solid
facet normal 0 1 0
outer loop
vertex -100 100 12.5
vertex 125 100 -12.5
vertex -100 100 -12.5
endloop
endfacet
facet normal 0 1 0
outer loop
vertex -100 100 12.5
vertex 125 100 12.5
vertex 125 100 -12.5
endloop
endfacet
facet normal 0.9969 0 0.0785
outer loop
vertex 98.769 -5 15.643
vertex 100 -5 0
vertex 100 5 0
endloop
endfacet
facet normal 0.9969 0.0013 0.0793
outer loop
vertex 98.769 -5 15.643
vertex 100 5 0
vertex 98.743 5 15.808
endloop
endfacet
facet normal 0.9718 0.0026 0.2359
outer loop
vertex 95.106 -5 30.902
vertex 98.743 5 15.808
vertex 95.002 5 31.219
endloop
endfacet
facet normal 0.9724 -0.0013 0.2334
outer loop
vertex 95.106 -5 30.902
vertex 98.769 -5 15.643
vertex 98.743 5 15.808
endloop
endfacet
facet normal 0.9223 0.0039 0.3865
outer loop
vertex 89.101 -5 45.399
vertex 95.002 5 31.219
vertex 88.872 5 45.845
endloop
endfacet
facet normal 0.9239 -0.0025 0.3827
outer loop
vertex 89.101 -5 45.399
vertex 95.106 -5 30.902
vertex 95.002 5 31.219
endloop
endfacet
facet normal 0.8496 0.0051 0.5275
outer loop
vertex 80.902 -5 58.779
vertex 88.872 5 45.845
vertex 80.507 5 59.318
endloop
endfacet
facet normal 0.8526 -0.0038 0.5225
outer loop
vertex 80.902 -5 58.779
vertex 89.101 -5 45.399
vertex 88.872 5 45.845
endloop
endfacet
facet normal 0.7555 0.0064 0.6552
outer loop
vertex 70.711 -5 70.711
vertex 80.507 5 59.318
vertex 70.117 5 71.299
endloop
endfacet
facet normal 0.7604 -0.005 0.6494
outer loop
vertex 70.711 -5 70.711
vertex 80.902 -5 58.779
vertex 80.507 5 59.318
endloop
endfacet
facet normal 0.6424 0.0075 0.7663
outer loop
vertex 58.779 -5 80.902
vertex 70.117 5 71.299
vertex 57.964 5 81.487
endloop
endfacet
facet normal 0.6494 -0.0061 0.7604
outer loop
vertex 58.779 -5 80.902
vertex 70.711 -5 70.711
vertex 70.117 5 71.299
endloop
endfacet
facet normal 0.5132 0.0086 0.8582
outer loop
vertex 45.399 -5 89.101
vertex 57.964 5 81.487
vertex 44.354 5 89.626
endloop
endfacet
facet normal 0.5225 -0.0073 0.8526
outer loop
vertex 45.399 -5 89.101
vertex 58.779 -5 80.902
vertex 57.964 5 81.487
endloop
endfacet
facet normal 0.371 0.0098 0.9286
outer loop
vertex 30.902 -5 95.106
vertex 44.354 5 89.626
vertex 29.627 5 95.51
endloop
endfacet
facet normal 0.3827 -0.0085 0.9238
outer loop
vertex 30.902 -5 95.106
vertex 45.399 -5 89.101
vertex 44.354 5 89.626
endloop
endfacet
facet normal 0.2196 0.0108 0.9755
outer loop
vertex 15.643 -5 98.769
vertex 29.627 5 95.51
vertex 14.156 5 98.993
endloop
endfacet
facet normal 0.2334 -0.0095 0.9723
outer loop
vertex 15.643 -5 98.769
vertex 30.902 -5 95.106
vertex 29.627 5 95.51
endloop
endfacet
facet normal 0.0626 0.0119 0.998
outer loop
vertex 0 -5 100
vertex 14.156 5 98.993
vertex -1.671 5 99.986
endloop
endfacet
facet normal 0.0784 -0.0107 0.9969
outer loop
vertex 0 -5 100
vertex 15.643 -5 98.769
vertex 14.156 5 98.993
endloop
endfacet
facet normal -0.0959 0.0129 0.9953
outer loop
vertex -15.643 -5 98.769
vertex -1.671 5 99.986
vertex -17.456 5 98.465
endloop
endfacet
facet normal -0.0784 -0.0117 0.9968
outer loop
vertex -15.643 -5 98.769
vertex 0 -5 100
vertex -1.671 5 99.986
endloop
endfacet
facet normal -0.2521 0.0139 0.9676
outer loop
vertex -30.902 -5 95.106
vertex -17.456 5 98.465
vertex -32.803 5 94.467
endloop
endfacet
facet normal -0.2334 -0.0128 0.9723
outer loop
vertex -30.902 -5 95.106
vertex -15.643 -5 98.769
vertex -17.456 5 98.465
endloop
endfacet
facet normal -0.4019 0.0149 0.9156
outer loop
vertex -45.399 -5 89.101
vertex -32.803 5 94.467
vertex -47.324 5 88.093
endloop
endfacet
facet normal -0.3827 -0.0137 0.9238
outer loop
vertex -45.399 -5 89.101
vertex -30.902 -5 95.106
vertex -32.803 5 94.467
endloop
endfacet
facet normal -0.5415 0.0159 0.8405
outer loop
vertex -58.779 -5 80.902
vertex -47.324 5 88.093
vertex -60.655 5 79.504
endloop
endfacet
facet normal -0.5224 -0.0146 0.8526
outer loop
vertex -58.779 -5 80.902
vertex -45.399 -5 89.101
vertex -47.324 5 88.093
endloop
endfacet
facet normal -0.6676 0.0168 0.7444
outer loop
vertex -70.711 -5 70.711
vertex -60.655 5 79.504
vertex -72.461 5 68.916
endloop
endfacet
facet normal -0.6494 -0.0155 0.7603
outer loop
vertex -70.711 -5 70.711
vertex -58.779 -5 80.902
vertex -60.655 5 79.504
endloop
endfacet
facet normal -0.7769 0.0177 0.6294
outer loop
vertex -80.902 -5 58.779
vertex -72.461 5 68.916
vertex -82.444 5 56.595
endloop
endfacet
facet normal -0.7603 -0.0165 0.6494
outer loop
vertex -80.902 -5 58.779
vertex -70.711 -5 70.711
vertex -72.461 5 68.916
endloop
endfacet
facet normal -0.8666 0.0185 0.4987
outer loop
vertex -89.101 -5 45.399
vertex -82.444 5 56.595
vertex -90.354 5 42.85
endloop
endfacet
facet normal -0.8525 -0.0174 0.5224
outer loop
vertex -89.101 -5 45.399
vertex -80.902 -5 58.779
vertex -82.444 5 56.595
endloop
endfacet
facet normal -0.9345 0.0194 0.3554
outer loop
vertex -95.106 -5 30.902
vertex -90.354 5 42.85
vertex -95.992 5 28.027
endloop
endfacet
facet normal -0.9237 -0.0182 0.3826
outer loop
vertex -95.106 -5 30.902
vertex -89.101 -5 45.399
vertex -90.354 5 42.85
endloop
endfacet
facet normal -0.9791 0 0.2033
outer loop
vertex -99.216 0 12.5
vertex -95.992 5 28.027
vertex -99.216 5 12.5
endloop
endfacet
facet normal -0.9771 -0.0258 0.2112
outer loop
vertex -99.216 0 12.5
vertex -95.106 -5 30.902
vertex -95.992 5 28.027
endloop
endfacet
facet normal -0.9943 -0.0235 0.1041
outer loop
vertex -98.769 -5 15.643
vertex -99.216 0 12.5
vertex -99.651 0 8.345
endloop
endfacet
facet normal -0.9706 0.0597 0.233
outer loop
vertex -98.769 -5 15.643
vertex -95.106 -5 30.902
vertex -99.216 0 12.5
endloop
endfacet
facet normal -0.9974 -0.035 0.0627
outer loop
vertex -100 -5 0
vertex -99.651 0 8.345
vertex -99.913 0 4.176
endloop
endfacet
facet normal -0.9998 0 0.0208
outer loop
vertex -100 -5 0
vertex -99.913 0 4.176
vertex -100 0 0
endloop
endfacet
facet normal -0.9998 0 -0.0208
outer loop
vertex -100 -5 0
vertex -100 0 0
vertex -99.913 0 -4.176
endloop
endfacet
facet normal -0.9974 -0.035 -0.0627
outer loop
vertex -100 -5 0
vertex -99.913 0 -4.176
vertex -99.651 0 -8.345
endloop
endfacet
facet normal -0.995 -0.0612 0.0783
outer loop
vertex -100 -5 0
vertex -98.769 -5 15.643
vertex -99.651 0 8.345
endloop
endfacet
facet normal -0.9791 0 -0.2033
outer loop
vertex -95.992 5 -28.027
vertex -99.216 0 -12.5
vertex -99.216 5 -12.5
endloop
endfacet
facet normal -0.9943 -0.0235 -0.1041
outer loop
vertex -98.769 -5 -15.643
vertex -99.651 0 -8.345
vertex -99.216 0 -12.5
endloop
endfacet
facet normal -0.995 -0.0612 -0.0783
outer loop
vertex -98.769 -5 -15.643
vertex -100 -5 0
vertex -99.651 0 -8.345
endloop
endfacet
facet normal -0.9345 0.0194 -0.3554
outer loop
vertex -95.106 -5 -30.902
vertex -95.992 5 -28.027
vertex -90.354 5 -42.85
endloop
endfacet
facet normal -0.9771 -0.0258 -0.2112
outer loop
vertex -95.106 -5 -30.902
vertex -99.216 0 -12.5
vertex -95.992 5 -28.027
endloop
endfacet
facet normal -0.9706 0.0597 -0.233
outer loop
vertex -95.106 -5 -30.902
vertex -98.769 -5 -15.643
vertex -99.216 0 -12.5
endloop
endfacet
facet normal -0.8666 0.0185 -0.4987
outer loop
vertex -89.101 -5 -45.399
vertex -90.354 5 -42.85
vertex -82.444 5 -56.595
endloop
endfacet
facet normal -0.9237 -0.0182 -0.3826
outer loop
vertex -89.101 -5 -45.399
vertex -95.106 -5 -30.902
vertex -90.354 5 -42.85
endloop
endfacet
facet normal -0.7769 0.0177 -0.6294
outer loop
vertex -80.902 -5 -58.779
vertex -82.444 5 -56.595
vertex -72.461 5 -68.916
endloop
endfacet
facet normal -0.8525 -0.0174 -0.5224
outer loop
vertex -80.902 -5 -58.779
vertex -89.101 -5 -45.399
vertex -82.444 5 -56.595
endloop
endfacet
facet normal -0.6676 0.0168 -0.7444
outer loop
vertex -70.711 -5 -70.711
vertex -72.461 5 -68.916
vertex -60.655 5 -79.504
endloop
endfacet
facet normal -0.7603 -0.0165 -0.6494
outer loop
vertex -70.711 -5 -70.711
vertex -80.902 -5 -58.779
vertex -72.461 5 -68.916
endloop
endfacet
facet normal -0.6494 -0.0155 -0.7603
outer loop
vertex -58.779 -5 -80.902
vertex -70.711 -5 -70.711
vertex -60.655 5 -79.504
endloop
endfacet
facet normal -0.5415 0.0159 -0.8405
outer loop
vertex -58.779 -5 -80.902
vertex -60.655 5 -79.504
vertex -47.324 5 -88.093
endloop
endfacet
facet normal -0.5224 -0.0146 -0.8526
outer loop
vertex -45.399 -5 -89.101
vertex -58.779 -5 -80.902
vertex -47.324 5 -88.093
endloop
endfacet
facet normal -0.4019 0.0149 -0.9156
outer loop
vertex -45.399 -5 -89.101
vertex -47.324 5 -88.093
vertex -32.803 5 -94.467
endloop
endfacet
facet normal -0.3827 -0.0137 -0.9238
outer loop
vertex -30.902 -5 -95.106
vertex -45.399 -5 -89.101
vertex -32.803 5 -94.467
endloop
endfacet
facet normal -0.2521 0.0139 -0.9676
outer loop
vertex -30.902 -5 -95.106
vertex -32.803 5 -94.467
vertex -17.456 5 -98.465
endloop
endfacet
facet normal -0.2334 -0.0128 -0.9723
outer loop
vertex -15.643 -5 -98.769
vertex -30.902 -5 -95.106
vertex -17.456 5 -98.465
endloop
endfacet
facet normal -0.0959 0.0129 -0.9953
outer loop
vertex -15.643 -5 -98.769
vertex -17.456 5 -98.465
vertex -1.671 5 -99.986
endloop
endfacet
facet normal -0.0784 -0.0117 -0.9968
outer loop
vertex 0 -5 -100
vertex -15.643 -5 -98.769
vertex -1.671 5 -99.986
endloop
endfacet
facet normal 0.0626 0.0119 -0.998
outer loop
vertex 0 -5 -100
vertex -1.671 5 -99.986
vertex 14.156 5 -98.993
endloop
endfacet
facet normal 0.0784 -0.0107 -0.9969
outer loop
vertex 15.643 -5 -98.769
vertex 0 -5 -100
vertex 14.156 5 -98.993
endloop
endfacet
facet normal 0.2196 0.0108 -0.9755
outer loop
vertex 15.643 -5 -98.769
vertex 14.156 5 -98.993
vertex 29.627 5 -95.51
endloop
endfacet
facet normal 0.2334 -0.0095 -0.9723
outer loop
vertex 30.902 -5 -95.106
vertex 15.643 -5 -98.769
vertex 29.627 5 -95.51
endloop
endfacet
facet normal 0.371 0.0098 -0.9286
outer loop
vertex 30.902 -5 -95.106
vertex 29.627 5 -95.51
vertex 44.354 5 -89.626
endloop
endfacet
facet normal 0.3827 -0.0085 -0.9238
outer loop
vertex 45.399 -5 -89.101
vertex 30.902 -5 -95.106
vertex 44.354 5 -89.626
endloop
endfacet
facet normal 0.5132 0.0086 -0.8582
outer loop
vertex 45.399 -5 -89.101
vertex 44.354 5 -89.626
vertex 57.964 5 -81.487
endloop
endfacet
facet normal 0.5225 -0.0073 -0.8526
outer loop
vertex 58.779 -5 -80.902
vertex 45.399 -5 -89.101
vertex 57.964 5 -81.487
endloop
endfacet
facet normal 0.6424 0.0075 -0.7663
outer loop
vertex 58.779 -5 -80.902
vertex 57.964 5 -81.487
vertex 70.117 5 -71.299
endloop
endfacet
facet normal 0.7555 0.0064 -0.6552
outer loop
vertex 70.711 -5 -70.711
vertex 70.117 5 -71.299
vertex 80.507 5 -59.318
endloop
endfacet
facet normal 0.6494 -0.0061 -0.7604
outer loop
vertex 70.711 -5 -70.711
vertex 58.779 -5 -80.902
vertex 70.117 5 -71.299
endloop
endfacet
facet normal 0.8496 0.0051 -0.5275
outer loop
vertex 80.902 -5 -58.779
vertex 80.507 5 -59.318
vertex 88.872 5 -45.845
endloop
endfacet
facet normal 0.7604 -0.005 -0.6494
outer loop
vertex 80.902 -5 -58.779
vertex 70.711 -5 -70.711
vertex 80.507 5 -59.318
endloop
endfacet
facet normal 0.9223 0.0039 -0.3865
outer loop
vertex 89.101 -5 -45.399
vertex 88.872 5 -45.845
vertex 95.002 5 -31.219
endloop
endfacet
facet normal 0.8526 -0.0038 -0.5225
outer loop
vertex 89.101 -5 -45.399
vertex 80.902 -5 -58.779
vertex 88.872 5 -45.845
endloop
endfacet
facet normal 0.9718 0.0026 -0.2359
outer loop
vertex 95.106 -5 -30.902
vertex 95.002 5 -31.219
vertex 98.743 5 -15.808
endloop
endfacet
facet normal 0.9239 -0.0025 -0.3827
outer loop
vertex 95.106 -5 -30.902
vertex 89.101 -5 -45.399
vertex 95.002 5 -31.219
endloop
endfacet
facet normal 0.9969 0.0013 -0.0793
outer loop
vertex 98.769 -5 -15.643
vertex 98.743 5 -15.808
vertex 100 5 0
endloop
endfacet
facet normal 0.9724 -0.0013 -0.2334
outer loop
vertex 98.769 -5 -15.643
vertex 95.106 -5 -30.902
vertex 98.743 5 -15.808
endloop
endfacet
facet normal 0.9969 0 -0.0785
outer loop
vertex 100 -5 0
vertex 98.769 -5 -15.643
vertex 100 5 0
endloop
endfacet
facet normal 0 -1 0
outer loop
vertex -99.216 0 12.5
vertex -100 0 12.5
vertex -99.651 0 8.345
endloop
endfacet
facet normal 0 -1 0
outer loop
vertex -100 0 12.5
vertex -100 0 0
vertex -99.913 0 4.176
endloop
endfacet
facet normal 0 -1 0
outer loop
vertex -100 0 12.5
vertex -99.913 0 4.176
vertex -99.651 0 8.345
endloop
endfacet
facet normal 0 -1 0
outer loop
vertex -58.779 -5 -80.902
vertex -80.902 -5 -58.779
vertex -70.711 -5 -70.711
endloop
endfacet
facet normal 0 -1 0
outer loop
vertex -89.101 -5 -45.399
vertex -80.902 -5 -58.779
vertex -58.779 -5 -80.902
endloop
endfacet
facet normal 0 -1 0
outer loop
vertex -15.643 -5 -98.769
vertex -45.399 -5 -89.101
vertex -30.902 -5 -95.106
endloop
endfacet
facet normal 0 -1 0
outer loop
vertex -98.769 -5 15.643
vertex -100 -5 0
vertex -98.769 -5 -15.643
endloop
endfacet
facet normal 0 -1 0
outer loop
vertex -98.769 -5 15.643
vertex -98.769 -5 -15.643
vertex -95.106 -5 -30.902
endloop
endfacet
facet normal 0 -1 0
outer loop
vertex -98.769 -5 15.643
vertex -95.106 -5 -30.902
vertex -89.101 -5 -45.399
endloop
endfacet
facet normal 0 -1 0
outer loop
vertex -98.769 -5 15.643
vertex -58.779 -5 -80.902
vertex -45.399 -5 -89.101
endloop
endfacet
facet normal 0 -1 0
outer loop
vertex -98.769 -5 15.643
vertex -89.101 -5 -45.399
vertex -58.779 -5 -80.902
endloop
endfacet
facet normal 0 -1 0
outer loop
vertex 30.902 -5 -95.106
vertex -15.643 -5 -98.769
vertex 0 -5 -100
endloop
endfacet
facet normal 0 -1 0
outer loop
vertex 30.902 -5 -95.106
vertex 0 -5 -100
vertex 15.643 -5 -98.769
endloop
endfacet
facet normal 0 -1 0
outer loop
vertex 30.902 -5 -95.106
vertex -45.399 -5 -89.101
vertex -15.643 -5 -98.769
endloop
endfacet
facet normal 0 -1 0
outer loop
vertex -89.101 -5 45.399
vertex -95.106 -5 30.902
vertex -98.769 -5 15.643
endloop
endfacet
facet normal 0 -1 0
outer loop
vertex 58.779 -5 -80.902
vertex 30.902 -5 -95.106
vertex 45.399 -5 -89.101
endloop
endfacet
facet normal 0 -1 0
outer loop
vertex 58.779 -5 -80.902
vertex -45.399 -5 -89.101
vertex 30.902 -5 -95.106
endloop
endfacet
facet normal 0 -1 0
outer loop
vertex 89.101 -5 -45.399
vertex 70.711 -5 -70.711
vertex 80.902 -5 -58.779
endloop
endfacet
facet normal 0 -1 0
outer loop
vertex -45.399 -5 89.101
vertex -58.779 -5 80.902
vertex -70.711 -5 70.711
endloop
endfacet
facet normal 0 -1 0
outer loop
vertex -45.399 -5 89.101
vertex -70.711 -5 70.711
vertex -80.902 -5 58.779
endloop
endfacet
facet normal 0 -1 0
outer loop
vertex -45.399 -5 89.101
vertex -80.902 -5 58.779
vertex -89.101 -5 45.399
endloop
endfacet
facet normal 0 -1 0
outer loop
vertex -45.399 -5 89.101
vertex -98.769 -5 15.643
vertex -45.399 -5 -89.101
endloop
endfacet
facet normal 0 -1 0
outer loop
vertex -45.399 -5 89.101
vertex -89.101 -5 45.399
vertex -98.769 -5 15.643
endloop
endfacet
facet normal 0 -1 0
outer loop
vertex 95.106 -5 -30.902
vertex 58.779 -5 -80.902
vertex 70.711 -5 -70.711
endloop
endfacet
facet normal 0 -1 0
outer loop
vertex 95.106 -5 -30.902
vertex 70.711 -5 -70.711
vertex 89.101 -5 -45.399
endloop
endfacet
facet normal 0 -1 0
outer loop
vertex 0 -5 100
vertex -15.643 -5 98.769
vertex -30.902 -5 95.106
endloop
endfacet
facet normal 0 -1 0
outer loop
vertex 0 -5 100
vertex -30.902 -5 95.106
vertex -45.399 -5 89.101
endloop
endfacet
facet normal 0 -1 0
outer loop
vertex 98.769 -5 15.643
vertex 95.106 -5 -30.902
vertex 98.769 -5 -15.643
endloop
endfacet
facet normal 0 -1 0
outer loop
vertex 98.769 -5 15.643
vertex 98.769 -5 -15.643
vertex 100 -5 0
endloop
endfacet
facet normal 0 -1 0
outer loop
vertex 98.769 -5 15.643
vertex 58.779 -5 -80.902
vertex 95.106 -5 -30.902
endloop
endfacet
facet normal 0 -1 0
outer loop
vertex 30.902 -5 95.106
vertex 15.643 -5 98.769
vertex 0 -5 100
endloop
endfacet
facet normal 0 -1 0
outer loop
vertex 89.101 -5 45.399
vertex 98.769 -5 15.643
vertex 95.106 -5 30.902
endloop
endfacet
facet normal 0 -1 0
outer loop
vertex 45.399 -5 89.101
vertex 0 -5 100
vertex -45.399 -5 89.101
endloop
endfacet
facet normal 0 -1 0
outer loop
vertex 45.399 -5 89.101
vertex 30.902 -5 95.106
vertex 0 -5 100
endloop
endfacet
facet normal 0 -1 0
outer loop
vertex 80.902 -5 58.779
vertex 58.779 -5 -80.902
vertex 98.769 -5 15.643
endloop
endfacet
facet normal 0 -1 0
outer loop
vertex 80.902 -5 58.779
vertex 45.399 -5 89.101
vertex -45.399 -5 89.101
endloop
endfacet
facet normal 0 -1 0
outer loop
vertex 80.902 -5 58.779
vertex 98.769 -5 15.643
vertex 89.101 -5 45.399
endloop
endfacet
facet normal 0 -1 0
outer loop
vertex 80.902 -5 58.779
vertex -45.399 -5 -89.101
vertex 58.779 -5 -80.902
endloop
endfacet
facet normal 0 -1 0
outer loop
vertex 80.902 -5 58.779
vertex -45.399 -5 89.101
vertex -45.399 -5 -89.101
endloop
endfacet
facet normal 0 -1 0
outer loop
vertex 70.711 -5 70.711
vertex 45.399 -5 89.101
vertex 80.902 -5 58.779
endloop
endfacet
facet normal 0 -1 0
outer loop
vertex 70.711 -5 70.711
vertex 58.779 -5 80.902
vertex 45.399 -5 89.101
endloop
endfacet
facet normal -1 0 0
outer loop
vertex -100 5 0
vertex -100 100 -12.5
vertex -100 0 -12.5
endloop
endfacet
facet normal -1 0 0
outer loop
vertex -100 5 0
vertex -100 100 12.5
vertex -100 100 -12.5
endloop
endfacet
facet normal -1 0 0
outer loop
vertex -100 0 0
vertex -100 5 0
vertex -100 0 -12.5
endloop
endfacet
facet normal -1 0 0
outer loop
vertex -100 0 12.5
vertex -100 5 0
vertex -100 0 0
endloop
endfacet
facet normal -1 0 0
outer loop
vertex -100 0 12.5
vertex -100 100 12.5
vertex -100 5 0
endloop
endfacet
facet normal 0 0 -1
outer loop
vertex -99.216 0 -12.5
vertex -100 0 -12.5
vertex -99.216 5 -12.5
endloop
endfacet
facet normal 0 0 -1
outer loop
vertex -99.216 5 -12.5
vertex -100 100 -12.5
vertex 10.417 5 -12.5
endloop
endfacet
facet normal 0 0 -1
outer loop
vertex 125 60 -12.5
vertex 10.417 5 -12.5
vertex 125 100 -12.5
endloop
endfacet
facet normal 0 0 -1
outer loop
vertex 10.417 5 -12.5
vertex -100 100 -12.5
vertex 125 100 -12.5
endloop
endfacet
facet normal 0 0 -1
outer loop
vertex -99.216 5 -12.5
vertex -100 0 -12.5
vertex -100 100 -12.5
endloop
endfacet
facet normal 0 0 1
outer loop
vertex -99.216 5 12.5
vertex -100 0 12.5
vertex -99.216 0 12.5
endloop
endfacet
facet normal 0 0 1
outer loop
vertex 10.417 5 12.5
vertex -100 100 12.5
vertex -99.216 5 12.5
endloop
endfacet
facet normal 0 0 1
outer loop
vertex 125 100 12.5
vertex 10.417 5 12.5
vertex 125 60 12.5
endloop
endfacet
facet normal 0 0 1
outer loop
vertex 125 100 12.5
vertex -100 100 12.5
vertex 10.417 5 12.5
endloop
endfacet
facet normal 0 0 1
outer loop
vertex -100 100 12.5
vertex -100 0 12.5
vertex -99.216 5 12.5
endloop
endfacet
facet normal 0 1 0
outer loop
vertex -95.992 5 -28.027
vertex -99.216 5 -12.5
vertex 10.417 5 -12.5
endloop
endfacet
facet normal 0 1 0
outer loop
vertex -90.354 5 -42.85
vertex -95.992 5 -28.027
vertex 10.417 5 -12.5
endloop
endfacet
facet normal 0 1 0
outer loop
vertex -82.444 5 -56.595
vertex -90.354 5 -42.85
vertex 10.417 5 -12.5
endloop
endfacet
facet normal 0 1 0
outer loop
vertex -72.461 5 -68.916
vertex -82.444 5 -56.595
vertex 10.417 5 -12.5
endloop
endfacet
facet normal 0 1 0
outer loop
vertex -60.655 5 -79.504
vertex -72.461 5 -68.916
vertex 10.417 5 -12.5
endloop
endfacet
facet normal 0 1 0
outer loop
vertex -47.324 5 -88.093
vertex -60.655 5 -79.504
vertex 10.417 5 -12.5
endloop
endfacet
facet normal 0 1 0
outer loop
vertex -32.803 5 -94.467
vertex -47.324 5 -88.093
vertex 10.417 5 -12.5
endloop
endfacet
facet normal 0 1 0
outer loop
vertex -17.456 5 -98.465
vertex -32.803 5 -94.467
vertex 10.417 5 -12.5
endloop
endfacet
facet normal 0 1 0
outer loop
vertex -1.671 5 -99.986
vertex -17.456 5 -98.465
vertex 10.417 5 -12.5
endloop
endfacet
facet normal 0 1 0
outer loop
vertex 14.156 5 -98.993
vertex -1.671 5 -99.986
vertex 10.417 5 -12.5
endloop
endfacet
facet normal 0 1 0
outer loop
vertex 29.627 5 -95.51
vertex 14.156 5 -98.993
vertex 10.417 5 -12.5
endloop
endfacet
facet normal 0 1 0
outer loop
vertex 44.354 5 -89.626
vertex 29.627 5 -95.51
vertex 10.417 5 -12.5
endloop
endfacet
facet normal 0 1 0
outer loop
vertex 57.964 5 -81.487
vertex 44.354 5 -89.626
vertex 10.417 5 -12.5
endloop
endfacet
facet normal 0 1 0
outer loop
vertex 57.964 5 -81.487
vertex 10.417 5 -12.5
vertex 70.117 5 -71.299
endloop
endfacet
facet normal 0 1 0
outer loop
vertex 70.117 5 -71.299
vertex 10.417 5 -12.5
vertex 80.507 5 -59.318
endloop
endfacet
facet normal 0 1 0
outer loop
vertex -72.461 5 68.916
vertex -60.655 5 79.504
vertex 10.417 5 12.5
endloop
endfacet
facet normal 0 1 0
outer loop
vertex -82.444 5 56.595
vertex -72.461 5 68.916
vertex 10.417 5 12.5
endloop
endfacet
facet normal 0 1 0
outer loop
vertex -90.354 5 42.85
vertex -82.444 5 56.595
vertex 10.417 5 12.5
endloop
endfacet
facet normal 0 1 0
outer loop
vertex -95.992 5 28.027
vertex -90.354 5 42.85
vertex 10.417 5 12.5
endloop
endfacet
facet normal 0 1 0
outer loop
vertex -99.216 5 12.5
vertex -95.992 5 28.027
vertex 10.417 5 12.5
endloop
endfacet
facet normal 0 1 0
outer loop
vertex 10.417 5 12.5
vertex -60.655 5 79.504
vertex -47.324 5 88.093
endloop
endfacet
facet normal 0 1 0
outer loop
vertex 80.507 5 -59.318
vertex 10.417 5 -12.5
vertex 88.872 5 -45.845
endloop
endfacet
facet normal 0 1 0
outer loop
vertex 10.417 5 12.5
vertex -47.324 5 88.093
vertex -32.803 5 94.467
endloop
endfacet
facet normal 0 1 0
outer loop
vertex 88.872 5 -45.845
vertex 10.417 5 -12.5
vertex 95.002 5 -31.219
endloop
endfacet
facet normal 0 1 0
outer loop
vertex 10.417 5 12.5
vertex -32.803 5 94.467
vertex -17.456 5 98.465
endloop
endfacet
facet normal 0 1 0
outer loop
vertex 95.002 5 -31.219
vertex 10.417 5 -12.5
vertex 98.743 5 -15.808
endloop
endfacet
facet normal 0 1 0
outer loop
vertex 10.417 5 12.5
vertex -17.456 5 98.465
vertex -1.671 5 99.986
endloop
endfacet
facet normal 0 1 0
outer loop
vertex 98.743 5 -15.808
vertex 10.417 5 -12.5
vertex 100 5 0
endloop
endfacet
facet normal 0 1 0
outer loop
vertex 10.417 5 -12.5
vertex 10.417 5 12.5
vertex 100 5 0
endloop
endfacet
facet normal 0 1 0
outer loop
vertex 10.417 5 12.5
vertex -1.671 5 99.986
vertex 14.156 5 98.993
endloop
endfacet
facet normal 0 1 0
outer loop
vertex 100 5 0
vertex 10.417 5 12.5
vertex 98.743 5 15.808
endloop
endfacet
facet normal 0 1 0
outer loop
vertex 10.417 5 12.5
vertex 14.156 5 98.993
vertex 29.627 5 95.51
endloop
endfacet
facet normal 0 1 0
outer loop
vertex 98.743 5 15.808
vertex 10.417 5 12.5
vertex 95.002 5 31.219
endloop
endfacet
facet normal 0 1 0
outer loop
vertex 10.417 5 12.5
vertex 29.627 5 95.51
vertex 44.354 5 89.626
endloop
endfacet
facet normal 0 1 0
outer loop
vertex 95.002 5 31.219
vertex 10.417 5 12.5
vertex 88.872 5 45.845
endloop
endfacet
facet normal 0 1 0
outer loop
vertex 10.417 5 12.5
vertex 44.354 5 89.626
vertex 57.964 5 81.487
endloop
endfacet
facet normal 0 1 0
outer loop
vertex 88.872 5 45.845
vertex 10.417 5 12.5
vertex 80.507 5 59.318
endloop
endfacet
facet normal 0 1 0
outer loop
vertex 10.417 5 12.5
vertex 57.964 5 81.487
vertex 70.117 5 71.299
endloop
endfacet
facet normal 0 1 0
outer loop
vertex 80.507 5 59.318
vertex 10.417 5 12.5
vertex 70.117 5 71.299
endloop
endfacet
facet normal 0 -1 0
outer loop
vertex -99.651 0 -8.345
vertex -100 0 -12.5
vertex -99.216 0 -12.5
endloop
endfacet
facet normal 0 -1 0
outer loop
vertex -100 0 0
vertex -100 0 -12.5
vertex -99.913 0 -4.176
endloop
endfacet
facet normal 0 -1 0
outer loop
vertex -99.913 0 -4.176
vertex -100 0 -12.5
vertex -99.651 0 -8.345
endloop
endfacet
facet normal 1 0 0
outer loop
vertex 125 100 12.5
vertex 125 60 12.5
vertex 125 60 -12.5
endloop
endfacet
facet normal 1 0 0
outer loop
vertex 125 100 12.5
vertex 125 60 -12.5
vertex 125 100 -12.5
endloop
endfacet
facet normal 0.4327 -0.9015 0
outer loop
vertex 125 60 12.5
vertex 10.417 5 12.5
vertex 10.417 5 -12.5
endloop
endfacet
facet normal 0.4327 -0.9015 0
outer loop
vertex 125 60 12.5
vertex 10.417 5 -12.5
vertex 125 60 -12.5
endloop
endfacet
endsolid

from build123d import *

# Parameters (mm, degrees)
F0_R     = 100
F1_DEPTH = 5
F3_DEPTH = 12.5


with BuildPart() as f1:
    # F0 (on Front) → F1 (new body, symmetric)
    with BuildSketch(Plane.XZ):
        Circle(F0_R)
    extrude(amount=F1_DEPTH, both=True)

    # F2 (on Top) → F3 (join, symmetric)
    with BuildSketch(Plane.XY):
        Polygon((-100, 0), (0, 0), (125, 60), (125, 100), (-100, 100), align=None)
    extrude(amount=F3_DEPTH, both=True)


solid = f1.part
